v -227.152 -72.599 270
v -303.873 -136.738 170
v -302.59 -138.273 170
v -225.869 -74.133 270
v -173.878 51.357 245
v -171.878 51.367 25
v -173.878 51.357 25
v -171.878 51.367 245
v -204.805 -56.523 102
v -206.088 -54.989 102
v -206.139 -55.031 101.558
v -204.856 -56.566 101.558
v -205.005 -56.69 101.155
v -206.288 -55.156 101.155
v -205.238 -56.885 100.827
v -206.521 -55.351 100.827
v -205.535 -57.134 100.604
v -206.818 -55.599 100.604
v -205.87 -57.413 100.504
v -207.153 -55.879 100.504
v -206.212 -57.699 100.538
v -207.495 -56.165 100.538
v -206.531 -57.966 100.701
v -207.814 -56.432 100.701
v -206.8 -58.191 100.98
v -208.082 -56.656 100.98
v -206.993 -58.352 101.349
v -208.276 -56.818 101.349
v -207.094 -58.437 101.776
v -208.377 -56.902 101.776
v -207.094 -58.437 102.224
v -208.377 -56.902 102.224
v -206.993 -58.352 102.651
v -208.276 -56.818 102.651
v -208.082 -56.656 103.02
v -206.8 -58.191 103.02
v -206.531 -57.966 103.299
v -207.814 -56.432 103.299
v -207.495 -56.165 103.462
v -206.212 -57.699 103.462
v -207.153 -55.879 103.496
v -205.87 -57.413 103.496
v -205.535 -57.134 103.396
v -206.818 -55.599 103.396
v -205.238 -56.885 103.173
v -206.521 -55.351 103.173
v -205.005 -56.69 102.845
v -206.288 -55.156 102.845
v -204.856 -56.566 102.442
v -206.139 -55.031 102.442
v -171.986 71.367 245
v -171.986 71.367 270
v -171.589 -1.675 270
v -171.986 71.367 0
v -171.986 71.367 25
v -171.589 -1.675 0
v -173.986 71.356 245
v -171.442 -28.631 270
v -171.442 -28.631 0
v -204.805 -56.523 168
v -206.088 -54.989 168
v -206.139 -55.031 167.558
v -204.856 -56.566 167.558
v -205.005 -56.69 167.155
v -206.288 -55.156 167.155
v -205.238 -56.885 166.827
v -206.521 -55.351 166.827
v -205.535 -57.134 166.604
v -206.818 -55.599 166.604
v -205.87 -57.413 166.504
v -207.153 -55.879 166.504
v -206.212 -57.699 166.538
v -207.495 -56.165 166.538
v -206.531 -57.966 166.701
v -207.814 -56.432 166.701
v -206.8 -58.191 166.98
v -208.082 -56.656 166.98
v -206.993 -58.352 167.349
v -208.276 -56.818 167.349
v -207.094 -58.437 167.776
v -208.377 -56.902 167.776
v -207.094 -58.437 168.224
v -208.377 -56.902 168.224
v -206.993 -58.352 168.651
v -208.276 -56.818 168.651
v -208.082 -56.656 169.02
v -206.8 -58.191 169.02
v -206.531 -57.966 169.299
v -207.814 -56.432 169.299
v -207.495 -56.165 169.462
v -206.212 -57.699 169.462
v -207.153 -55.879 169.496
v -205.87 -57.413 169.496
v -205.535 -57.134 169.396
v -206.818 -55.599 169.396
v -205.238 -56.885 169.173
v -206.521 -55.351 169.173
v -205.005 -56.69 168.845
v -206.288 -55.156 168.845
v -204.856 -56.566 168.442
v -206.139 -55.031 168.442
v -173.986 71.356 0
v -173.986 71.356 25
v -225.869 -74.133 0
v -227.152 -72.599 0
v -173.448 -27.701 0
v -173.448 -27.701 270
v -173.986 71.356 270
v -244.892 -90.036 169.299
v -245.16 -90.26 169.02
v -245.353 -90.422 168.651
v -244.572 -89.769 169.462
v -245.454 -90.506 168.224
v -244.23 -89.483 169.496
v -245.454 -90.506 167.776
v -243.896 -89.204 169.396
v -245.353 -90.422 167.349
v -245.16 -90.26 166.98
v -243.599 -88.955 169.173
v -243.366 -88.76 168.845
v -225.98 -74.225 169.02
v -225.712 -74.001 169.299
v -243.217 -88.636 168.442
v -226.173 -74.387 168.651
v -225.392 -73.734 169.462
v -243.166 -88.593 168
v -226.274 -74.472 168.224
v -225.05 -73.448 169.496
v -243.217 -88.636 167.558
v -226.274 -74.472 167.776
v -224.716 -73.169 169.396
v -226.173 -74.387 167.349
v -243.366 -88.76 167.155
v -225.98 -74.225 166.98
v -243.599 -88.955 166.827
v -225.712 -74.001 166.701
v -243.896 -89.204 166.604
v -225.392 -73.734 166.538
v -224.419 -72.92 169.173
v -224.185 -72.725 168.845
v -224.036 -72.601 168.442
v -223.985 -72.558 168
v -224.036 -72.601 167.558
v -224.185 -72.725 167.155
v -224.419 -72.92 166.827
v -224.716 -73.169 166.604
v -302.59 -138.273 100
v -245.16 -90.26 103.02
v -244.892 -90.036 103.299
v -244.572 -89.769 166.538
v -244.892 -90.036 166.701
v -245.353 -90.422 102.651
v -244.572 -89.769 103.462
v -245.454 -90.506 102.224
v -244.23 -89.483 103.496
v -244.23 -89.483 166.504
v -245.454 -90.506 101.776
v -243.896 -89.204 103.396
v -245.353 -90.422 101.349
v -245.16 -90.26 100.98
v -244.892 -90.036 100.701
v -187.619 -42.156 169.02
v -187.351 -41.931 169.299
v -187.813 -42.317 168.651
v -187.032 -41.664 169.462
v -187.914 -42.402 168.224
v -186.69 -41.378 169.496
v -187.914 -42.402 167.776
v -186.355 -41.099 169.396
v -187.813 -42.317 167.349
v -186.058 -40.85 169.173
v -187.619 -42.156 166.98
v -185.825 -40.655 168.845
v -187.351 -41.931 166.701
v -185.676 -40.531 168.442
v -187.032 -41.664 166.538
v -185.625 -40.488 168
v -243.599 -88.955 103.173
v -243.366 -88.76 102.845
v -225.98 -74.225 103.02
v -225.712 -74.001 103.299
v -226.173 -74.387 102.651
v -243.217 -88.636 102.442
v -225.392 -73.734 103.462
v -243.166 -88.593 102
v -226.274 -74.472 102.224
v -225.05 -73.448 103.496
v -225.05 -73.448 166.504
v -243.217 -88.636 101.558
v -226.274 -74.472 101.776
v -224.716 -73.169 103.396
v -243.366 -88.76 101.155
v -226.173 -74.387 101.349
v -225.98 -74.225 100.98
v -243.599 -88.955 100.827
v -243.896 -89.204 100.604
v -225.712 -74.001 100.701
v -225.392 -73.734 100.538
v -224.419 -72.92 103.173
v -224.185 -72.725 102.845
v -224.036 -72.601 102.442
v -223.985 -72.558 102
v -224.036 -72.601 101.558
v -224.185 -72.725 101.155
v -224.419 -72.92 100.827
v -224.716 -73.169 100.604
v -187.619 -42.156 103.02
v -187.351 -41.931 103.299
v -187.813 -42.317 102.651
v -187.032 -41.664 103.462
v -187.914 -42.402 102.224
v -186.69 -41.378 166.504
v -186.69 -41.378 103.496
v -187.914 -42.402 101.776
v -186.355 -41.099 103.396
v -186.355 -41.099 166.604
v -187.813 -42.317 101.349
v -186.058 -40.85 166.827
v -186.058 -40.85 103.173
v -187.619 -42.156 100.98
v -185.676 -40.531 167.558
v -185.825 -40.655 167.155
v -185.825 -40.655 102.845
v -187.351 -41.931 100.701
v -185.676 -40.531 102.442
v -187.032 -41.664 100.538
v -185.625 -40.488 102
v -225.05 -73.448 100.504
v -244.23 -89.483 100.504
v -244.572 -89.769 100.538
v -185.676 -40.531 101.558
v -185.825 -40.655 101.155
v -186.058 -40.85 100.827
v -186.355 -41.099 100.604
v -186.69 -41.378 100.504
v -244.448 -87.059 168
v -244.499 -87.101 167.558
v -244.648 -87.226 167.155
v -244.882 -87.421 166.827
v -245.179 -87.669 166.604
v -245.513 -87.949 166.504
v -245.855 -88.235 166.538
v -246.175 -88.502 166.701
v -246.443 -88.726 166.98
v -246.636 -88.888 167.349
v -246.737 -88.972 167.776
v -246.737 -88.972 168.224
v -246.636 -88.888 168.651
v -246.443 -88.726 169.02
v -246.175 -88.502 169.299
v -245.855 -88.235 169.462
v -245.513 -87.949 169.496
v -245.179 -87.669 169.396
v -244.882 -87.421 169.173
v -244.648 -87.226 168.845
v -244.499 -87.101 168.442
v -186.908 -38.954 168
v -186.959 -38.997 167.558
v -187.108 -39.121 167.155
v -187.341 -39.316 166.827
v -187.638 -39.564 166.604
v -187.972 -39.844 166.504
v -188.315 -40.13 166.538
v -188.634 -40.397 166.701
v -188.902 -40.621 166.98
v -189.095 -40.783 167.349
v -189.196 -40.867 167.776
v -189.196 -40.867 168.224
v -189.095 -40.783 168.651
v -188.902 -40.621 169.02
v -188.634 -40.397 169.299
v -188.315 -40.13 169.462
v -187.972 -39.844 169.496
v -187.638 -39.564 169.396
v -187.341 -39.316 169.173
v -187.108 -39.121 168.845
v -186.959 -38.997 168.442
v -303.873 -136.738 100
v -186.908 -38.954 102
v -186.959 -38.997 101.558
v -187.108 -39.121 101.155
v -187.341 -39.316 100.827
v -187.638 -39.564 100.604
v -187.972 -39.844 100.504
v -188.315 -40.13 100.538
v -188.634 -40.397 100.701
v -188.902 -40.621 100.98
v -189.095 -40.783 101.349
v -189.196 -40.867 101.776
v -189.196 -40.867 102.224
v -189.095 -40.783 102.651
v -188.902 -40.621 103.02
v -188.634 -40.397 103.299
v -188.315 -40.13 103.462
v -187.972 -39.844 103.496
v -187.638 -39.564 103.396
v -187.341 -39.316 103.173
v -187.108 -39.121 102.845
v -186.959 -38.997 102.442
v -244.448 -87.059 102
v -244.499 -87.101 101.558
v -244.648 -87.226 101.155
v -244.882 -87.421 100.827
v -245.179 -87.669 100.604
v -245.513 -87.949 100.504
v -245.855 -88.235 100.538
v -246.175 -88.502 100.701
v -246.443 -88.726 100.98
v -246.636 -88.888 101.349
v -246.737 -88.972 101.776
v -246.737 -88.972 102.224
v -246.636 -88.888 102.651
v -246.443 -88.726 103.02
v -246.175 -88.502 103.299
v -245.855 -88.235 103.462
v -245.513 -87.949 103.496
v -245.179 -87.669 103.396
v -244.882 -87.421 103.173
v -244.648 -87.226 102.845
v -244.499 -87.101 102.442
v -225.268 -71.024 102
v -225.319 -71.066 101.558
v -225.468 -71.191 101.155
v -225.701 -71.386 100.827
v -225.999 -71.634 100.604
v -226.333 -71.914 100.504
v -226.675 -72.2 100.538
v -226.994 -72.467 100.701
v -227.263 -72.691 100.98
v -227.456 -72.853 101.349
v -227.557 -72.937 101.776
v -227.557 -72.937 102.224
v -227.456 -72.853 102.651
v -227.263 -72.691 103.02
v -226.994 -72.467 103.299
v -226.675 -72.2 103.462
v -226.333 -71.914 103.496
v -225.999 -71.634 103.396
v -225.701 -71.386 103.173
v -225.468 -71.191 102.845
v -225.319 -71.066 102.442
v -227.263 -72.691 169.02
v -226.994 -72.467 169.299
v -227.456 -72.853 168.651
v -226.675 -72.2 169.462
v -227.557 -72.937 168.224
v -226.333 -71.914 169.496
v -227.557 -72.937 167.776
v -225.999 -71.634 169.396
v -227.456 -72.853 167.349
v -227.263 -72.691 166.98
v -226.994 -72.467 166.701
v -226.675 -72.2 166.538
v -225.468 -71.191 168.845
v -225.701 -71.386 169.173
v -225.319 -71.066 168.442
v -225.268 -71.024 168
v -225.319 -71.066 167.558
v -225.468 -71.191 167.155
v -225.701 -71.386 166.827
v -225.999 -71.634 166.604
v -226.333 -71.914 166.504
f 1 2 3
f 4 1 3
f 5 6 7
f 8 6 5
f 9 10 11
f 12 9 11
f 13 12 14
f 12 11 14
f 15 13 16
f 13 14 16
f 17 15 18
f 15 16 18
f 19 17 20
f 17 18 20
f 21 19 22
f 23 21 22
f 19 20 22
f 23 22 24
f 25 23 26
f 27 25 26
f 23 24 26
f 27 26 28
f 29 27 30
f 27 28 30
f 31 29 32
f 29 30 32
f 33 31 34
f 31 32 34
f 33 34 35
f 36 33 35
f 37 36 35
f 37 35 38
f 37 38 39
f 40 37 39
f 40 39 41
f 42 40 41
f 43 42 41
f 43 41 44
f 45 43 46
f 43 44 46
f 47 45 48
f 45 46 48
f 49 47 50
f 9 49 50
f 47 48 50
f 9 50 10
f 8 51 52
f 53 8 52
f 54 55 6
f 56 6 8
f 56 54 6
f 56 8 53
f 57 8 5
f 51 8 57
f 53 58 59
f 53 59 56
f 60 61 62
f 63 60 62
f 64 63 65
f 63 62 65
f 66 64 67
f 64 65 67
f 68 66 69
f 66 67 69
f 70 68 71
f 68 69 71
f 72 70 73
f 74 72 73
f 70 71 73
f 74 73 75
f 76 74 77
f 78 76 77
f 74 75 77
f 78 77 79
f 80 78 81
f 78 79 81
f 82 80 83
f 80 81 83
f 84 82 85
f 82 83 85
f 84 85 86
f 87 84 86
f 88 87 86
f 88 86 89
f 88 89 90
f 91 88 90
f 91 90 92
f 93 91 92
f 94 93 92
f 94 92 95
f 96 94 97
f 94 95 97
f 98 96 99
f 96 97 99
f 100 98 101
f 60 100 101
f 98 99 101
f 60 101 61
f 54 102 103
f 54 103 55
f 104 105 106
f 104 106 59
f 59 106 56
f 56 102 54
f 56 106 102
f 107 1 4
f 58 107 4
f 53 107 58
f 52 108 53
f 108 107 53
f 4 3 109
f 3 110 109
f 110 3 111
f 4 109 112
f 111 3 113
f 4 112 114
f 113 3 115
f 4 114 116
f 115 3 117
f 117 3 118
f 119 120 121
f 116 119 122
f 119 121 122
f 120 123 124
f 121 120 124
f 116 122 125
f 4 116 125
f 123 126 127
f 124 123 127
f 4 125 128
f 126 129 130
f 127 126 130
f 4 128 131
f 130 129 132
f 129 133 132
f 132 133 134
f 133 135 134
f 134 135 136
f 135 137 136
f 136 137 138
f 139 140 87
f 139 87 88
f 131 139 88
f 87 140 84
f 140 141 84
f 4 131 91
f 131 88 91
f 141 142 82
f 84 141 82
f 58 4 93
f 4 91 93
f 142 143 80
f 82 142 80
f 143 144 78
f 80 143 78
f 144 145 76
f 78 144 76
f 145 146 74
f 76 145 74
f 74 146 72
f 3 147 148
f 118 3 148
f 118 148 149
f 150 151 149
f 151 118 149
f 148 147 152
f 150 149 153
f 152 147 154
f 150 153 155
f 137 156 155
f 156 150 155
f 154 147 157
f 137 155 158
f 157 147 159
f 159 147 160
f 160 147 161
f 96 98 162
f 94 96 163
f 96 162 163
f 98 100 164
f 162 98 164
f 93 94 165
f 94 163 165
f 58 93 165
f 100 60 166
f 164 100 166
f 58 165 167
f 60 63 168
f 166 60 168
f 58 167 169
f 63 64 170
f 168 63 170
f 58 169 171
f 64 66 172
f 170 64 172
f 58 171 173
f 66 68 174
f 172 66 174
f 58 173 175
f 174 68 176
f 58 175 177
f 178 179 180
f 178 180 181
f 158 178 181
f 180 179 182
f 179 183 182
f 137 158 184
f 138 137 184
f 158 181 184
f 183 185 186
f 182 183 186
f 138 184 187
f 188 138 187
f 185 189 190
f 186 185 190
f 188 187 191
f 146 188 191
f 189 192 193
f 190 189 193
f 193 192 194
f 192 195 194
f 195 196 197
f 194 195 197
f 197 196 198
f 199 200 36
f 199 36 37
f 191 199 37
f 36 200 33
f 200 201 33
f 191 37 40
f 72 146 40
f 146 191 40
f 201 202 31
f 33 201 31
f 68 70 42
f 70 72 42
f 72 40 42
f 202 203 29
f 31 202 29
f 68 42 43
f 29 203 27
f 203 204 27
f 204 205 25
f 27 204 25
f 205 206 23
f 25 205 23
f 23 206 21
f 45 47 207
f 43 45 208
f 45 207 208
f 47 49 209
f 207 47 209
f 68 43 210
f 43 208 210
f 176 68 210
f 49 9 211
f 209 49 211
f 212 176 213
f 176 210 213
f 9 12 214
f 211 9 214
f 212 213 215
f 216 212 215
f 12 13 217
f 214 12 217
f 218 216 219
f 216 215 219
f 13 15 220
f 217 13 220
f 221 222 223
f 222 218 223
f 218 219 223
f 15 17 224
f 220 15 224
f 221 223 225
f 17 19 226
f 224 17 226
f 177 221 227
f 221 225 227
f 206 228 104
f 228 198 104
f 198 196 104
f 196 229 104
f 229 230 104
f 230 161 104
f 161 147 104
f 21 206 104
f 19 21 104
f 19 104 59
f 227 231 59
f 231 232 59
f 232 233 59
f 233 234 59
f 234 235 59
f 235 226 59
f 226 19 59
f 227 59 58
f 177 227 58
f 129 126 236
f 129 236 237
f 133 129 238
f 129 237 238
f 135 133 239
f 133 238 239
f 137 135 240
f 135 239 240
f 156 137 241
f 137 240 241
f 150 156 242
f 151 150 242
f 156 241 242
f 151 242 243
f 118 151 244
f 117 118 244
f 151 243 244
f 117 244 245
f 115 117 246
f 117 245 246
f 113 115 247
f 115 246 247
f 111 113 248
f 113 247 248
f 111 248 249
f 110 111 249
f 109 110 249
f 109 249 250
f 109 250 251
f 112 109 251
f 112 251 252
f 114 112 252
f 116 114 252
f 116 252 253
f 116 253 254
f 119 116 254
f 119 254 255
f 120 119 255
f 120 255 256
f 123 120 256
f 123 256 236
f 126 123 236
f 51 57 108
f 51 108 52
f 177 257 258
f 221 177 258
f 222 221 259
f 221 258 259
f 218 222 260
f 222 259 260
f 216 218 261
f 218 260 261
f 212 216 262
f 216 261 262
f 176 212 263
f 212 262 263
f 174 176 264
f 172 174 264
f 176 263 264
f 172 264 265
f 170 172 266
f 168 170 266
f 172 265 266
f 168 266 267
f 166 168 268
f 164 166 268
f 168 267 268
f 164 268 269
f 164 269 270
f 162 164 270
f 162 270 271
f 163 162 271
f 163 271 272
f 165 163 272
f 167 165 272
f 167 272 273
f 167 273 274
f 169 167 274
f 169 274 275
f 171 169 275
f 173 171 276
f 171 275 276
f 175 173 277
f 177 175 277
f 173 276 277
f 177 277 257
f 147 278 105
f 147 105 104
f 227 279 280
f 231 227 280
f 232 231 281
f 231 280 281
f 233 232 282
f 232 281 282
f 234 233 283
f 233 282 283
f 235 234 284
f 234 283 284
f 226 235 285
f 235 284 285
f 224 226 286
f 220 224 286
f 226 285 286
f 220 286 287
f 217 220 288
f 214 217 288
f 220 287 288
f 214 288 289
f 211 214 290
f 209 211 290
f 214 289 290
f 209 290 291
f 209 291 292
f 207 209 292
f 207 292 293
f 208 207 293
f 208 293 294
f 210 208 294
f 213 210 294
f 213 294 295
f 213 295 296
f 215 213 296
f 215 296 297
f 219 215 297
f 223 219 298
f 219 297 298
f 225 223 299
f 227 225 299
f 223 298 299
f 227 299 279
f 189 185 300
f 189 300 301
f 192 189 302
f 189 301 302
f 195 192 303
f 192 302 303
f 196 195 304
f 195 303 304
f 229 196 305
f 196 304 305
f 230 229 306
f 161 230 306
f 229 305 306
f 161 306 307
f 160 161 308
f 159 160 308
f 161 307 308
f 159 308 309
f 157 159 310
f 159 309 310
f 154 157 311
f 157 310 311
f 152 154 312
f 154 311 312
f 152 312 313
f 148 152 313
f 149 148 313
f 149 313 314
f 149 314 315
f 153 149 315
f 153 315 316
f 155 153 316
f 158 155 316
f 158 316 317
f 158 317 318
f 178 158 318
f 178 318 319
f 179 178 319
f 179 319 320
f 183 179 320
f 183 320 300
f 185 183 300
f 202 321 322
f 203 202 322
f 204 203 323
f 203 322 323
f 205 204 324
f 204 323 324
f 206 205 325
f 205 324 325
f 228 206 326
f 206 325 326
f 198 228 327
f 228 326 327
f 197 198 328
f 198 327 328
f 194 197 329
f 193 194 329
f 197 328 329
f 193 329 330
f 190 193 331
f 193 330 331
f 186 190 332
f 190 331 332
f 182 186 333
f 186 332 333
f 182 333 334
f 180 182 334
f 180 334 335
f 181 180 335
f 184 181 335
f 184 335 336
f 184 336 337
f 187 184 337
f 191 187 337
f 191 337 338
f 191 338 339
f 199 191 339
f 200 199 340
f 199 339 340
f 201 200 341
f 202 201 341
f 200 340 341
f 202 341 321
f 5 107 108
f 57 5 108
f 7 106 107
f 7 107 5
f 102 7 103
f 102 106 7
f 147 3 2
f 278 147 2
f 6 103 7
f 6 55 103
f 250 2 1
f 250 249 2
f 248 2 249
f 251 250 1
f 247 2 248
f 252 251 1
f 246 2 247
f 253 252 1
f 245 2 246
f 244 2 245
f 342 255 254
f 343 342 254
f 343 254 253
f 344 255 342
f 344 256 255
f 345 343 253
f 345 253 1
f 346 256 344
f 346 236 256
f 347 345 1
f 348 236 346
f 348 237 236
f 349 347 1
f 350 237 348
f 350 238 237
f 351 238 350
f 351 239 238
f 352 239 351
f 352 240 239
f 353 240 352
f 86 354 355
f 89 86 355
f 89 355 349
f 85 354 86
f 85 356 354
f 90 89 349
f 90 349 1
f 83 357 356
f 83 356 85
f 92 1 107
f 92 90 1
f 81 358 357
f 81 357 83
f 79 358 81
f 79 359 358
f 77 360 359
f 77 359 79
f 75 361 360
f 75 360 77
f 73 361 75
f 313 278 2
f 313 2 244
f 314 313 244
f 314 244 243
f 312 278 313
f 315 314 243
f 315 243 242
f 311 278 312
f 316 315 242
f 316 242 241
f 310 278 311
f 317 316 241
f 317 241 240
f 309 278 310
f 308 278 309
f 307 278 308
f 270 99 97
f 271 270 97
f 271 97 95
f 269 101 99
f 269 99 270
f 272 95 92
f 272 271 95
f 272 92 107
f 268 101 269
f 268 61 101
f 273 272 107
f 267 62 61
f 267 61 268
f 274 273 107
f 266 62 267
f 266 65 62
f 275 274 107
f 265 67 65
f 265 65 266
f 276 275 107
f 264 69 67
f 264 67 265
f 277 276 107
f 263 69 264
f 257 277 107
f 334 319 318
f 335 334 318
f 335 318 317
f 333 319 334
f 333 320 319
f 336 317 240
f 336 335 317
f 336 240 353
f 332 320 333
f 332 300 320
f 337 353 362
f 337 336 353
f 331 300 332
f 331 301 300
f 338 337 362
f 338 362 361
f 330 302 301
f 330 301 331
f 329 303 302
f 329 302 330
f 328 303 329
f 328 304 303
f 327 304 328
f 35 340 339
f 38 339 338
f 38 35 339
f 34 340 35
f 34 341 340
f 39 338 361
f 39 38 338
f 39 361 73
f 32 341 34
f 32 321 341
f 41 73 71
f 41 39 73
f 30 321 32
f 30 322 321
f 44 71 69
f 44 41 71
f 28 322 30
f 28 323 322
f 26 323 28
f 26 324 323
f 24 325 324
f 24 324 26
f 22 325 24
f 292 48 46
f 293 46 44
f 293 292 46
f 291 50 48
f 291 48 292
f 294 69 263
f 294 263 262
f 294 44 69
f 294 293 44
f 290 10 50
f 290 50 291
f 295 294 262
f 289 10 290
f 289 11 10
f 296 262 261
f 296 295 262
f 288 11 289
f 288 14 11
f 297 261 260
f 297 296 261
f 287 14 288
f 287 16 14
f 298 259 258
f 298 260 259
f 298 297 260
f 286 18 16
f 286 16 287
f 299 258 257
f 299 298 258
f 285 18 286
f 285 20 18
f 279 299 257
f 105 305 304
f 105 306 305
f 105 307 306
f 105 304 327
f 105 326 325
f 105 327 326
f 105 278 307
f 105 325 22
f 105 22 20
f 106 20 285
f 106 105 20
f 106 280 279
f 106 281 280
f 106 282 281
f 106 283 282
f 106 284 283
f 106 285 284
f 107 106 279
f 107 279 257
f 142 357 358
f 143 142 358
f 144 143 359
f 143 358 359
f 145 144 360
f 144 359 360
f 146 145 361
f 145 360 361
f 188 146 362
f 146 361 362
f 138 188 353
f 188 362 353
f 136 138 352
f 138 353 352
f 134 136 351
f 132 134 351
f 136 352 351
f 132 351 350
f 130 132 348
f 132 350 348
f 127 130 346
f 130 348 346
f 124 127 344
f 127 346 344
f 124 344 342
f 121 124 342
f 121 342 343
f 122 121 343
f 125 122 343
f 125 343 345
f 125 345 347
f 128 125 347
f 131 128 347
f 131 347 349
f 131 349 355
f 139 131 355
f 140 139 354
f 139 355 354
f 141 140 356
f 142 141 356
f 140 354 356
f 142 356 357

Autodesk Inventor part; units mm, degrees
ref_plane "YZ Plane" through (0, 0, 0) normal (1, 0, 0) x (0, 1, 0)
ref_plane "XZ Plane" through (0, 0, 0) normal (0, 1, 0) x (-1, 0, 0)
ref_plane "XY Plane" through (0, 0, 0) normal (0, 0, 1) x (1, 0, 0)
sketch "スケッチ1" plane through (0, 0, 0) normal (0, 0, 1) x (1, 0, 0)
  circle A0 centre (-149.101, -13.3308) radius 1.5 construction
  circle A1 centre (-160.5892, -1.6149) radius 1.5 construction
  circle A2 centre (-44.4492, 64.0137) radius 1.5 construction
  circle A3 centre (-64.4423, 49.0046) radius 1.5 construction
  circle A4 centre (-60.4494, 64.5064) radius 1.5 construction
  arc A5 (-40.2316, 58.3956) -> (-44.233, 71.0354) centre (-44.4492, 64.0137) ccw construction
  line L0 (-44.233, 71.0354) -> (-60.2332, 71.5281) construction
  arc A6 (-60.2332, 71.5281) -> (-64.1725, 70.4637) centre (-60.4494, 64.5064) ccw construction
  line L1 (-64.1725, 70.4637) -> (-165.9022, 6.8864) construction
  arc A7 (-165.9022, 6.8864) -> (-166.8262, -9.4635) centre (-160.5892, -1.6149) ccw construction
  line L2 (-166.8262, -9.4635) -> (-154.0782, -19.594) construction
  arc A8 (-154.0782, -19.594) -> (-144.2981, -19.7286) centre (-149.101, -13.3308) ccw construction
  line L3 (-144.2981, -19.7286) -> (-40.2316, 58.3956) construction
  circle A9 centre (-82.1645, 51.5544) radius 1.5 construction
  circle A10 centre (-141.748, 14.817) radius 1.5 construction
  circle A11 centre (-89.4637, 29.5642) radius 1.5 construction
  circle A12 centre (-117.4541, 8.5514) radius 1.5 construction
  circle A13 centre (-111.8449, 33.0052) radius 1.5 construction
  line L4 (-152.7009, -26.0367) -> (-305.9655, -141.0946)
  circle A14 centre (-149.101, -13.3308) radius 1.5 construction
  circle A15 centre (-149.101, -13.3308) radius 3 construction
  circle A16 centre (-149.101, -13.3308) radius 3 construction
  circle A17 centre (-160.5892, -1.6149) radius 9.025 construction
  circle A18 centre (-160.5892, -1.6149) radius 4.025
  line L5 (-152.7009, -26.0367) -> (-151.5741, -2.0382)
  line L6 (-64.1725, 70.4637) -> (-165.9022, 6.8864) construction
  line L7 (-144.2981, -19.7286) -> (-40.2316, 58.3956) construction
  line L8 (-305.9655, -141.0946) -> (-171.4423, -28.6314)
  line L9 (-160.5892, -1.6149) -> (-146.0204, -21.0215) construction
  line L10 (-146.0204, -21.0215) -> (-305.9655, -141.0946) construction
  circle A19 centre (-276.0256, -117.3678) radius 1
  circle A20 centre (-160.5892, -1.6149) radius 11
  line L11 (-171.4423, -28.6314) -> (-171.589, -1.6748)
  point P0 (0, 0)
  point P1 (0, 0)
  point P2 (0, 0)
  point P3 (-276.667, -116.6006)
  point P4 (-275.4252, -118.1676)
  point P5 (-151.8691, -8.3201)
  dimension "d6" = 22
  dimension "d0" = 6
  dimension "d1" = 8.05
  dimension "d2" = 5
  dimension "d3" = 3
  dimension "d4" = 200
  dimension "d5" = 2
  dimension "d7" = 3
  dimension "d8" = 6
sketch "スケッチ2" plane through (0, 0, 0) normal (0, 0, 1) x (1, 0, 0)
  line L0 (-305.9655, -141.0946) -> (-171.4423, -28.6314) projected
  line L1 (-171.4423, -28.6314) -> (-171.589, -1.6748) projected
  line L2 (-302.5902, -138.2728) -> (-303.873, -136.7384)
  line L3 (-303.873, -136.7384) -> (-173.4475, -27.7009)
  line L4 (-173.4475, -27.7009) -> (-173.9864, 71.3562)
  line L5 (-173.9864, 71.3562) -> (-171.9864, 71.3671)
  line L6 (-171.9864, 71.3671) -> (-171.589, -1.6748)
  point P0 (0, 0)
  dimension "d9" = 2
  dimension "d10" = 2
  dimension "d11" = 100
  dimension "d14" = 170
extrude "押し出し1" add sketch "スケッチ2" along normal blind 270
sketch "スケッチ3" plane through (0, 0, 270) normal (0, 0, 1) x (1, 0, 0)
  arc A0 (-225.7, -73.9915) -> (-224.5724, -73.0489) centre (-225.6172, -72.9448) ccw
  line L0 (-225.7, -73.9915) -> (-243.7526, -89.0838)
  arc A1 (-244.8802, -90.0264) -> (-243.7526, -89.0838) centre (-244.7975, -88.9797) ccw
  line L1 (-244.8802, -90.0264) -> (-276.667, -116.6006)
  arc A2 (-276.667, -116.6006) -> (-275.4252, -118.1676) centre (-276.0256, -117.3678) ccw
  line L2 (-275.4252, -118.1676) -> (-152.7009, -26.0367)
  line L3 (-152.7009, -26.0367) -> (-151.8691, -8.3201)
  arc A3 (-151.8691, -8.3201) -> (-171.589, -1.6748) centre (-160.5892, -1.6149) ccw
  line L4 (-171.589, -1.6748) -> (-171.4423, -28.6314)
  line L5 (-171.4423, -28.6314) -> (-186.2119, -40.979)
  arc A4 (-187.3395, -41.9217) -> (-186.2119, -40.979) centre (-187.2568, -40.8749) ccw
  line L6 (-187.3395, -41.9217) -> (-205.3922, -57.0139)
  arc A5 (-206.5197, -57.9566) -> (-205.3922, -57.0139) centre (-206.437, -56.9099) ccw
  line L7 (-206.5197, -57.9566) -> (-224.5724, -73.0489)
  circle A6 centre (-171.2358, -34.3242) radius 1.5
  circle A7 centre (-160.5892, -1.6149) radius 4.025
  point P0 (0, 0)
  point P1 (0, 0)
sketch "スケッチ4" plane through (-303.873, -136.7384, 270) normal (-0.6413971, 0.7672091, 0) x (0.7672091, 0.6413971, 0)
  line L0 (234.6628, 270) -> (234.6628, 0) projected
  circle A0 centre (150.9556, 102) radius 1.5
  circle A1 centre (125.9556, 102) radius 1.5
  circle A2 centre (100.9556, 102) radius 1.5
  circle A3 centre (75.9556, 102) radius 1.5
  line L1 (234.6628, 135) -> (-10.981, 135)
  circle A4 centre (150.9556, 168) radius 1.5
  circle A5 centre (125.9556, 168) radius 1.5
  circle A6 centre (100.9556, 168) radius 1.5
  circle A7 centre (75.9556, 168) radius 1.5
  line L2 (154.7693, 165) -> (132.5454, 165)
  line L3 (157.7493, 105) -> (143.6573, 105)
  point P0 (320.8377, 270)
  point P1 (150.9556, 0)
  point P2 (125.9556, 0)
  point P3 (100.9556, 0)
  point P4 (75.9556, 0)
  dimension "d15" = 3
  dimension "d16" = 3
  dimension "d17" = 3
  dimension "d18" = 3
  dimension "d20" = 33
  dimension "d27" = 3
  dimension "d28" = 3
  dimension "d29" = 60
extrude "押し出し2" cut sketch "スケッチ4" against normal through all
chamfer "面取り1" distance 100 angle 45 2 edges at (-303.2316, -137.5056, 0) (-303.2316, -137.5056, 270)
sketch "スケッチ5" plane through (-171.9864, 71.3671, 270) normal (0.9999852, 0.0054408, 0) x (0, 0, -1)
  line L0 (270, 0) -> (0, 0) projected
  line L1 (0, 0) -> (0, -99.0586) projected
  line L2 (0, 0) -> (25, 0)
  line L3 (270, 0) -> (245, 0)
  line L4 (245, 0) -> (245, -20)
  line L5 (245, -20) -> (25, -20)
  line L6 (25, -20) -> (25, 0)
  point P0 (270, -72.3018)
  dimension "d30" = 25
  dimension "d31" = 25
  dimension "d32" = 20
extrude "押し出し3" cut sketch "スケッチ5" against normal through all
equation "\"d8\" = d0"
properties part number "アームシールド1" material "ポリカーボネート、クリア"
